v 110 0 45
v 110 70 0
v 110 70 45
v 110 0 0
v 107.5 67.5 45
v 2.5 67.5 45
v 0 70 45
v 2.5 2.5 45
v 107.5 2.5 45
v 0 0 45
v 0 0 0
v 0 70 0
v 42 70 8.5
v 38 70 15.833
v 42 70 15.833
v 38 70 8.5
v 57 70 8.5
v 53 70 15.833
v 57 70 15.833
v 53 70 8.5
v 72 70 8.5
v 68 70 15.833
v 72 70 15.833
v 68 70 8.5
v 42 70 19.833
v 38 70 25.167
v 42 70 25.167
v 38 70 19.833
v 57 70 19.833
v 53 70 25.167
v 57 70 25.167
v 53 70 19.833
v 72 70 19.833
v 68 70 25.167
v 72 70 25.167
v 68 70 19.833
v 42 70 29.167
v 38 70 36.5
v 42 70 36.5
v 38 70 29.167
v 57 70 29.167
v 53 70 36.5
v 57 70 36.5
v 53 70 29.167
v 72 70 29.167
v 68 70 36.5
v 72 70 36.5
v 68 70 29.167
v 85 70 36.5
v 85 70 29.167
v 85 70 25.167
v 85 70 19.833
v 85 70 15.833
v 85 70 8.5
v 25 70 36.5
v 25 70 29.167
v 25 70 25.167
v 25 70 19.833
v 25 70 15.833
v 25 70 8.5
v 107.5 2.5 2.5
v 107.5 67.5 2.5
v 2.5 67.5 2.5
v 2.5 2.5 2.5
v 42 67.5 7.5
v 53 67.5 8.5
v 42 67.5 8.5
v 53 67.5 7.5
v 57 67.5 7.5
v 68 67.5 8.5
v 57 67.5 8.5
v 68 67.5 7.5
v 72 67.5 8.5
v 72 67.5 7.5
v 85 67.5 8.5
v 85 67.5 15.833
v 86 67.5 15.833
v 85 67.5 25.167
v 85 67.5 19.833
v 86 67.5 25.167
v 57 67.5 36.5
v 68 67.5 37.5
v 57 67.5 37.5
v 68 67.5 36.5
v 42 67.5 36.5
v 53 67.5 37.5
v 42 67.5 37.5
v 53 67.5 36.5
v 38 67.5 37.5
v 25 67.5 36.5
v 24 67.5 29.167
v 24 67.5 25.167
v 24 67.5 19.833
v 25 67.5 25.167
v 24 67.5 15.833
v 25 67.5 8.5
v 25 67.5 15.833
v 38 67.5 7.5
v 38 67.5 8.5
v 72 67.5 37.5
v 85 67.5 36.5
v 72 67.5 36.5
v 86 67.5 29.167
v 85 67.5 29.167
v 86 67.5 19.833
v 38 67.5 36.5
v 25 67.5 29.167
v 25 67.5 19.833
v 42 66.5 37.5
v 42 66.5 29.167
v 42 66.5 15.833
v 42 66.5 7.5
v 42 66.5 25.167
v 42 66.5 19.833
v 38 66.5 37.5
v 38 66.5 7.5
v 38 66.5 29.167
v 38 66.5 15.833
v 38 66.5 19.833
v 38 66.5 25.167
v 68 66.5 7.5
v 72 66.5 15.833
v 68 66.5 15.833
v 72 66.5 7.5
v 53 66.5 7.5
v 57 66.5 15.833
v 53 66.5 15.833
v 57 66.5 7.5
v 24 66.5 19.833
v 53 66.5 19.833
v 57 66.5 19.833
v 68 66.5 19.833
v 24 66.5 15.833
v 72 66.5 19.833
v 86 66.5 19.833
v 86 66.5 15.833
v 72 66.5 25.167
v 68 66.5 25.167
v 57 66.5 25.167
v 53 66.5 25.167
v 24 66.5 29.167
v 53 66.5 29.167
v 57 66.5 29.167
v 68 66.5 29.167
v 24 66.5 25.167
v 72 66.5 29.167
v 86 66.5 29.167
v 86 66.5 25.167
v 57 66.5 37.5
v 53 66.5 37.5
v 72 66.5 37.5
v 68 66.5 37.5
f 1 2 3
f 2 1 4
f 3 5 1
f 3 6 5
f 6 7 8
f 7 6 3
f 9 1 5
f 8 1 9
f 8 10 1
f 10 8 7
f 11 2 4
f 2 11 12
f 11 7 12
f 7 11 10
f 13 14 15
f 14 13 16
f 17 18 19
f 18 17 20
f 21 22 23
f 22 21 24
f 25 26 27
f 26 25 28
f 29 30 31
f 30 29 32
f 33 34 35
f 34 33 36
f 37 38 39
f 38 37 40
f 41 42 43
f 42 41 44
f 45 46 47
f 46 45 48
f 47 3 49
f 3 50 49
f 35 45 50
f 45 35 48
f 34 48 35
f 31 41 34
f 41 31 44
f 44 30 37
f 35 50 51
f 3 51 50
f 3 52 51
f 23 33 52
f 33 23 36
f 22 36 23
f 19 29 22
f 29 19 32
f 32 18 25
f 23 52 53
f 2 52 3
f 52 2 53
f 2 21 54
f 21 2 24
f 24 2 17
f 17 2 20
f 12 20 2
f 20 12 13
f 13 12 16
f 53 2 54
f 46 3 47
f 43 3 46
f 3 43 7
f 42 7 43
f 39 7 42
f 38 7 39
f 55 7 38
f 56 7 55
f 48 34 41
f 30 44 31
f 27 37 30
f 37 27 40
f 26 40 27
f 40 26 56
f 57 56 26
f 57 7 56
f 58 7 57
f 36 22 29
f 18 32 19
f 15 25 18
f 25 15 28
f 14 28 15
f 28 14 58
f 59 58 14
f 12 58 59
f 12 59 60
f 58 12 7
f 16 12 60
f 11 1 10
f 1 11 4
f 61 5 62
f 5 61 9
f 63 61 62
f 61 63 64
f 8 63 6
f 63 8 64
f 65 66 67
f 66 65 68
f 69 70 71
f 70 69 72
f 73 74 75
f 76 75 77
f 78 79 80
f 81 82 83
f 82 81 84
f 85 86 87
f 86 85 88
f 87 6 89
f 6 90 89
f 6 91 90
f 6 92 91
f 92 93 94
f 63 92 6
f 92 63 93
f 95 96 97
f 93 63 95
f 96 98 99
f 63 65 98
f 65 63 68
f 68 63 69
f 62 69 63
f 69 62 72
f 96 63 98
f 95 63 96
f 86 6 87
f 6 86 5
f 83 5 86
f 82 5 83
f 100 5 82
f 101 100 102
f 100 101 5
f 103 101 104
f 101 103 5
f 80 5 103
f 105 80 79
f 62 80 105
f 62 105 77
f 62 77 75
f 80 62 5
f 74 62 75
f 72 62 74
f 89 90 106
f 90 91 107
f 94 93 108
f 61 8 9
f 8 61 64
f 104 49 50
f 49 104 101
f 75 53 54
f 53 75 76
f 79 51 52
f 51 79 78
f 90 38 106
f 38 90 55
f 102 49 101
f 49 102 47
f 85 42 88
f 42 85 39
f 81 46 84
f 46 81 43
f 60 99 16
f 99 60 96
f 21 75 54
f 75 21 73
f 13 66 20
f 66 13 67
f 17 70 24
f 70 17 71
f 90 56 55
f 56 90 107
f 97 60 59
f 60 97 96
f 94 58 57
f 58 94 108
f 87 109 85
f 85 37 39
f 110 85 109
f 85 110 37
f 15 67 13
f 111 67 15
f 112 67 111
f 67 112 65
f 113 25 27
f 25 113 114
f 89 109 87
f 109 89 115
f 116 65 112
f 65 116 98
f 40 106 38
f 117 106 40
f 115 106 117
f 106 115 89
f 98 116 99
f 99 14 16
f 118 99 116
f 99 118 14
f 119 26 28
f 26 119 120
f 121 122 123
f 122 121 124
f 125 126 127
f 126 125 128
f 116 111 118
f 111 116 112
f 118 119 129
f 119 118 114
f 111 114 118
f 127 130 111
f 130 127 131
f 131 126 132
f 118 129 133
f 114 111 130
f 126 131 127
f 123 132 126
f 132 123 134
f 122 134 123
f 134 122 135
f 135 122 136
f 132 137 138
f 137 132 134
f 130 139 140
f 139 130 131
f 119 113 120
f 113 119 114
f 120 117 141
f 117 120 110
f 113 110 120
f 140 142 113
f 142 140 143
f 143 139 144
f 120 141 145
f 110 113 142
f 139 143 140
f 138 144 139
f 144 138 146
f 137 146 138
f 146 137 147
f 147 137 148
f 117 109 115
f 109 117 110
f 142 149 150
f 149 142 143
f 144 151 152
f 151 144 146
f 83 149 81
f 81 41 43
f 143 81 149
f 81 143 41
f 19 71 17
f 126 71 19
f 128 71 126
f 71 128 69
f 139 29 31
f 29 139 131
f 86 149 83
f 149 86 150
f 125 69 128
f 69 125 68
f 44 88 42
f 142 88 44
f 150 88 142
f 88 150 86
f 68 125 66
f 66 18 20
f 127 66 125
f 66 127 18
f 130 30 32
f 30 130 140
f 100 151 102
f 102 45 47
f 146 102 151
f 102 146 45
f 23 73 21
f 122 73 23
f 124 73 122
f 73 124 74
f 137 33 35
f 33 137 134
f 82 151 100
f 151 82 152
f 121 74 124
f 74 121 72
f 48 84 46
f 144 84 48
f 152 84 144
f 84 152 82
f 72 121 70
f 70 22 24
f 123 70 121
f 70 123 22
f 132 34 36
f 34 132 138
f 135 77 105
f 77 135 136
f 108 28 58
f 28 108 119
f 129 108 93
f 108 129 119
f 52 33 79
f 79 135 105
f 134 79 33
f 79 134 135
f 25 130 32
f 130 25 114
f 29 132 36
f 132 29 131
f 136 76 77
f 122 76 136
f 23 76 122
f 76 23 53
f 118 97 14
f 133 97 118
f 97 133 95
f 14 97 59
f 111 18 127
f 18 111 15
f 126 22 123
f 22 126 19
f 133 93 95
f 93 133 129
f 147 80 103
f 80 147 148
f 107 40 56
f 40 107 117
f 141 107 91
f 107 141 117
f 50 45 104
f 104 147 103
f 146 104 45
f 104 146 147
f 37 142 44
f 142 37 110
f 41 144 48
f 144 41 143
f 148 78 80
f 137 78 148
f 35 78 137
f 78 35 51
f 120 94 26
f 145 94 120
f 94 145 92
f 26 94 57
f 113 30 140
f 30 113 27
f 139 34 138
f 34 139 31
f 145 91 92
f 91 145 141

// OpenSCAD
$fn = 32;

// ----------------------------------------------------------------------
// Vent box: crossgrid enclosure
// ----------------------------------------------------------------------

// --- parameters (mm) ---
box_l = 110;              // box length, X
box_w = 70;               // box width, Y
box_h = 45;               // box height, Z
wall_t = 2.5;             // shell wall thickness
win_l = 60;               // vent window width, X
win_h = 28;               // vent window height, Z
bar_w = 4;                // grid bar width
n_v = 3;                  // vertical bar count
n_h = 2;                  // horizontal bar count

win_z0 = (box_h - win_h) / 2;  // window lower edge Z
v_step = win_l / (n_v + 1);  // vertical bar step
h_step = win_h / (n_h + 1);  // horizontal bar step

difference() {
  union() {
    difference() {
      cube([box_l, box_w, box_h]);
  translate([wall_t, wall_t, wall_t])
    cube([box_l - 2 * wall_t, box_w - 2 * wall_t, box_h]);
  translate([(box_l - win_l) / 2, box_w - wall_t - 1, win_z0])
    cube([win_l, wall_t + 2, win_h]);
    }
    for (i = [1 : n_v])
      translate([(box_l - win_l) / 2 + i * v_step - bar_w / 2,
                 box_w - wall_t - 1, win_z0 - 1])
        cube([bar_w, wall_t + 1, win_h + 2]);
    for (i = [1 : n_h])
      translate([(box_l - win_l) / 2 - 1, box_w - wall_t - 1,
                 win_z0 + i * h_step - bar_w / 2])
        cube([win_l + 2, wall_t + 1, bar_w]);
  }
}
